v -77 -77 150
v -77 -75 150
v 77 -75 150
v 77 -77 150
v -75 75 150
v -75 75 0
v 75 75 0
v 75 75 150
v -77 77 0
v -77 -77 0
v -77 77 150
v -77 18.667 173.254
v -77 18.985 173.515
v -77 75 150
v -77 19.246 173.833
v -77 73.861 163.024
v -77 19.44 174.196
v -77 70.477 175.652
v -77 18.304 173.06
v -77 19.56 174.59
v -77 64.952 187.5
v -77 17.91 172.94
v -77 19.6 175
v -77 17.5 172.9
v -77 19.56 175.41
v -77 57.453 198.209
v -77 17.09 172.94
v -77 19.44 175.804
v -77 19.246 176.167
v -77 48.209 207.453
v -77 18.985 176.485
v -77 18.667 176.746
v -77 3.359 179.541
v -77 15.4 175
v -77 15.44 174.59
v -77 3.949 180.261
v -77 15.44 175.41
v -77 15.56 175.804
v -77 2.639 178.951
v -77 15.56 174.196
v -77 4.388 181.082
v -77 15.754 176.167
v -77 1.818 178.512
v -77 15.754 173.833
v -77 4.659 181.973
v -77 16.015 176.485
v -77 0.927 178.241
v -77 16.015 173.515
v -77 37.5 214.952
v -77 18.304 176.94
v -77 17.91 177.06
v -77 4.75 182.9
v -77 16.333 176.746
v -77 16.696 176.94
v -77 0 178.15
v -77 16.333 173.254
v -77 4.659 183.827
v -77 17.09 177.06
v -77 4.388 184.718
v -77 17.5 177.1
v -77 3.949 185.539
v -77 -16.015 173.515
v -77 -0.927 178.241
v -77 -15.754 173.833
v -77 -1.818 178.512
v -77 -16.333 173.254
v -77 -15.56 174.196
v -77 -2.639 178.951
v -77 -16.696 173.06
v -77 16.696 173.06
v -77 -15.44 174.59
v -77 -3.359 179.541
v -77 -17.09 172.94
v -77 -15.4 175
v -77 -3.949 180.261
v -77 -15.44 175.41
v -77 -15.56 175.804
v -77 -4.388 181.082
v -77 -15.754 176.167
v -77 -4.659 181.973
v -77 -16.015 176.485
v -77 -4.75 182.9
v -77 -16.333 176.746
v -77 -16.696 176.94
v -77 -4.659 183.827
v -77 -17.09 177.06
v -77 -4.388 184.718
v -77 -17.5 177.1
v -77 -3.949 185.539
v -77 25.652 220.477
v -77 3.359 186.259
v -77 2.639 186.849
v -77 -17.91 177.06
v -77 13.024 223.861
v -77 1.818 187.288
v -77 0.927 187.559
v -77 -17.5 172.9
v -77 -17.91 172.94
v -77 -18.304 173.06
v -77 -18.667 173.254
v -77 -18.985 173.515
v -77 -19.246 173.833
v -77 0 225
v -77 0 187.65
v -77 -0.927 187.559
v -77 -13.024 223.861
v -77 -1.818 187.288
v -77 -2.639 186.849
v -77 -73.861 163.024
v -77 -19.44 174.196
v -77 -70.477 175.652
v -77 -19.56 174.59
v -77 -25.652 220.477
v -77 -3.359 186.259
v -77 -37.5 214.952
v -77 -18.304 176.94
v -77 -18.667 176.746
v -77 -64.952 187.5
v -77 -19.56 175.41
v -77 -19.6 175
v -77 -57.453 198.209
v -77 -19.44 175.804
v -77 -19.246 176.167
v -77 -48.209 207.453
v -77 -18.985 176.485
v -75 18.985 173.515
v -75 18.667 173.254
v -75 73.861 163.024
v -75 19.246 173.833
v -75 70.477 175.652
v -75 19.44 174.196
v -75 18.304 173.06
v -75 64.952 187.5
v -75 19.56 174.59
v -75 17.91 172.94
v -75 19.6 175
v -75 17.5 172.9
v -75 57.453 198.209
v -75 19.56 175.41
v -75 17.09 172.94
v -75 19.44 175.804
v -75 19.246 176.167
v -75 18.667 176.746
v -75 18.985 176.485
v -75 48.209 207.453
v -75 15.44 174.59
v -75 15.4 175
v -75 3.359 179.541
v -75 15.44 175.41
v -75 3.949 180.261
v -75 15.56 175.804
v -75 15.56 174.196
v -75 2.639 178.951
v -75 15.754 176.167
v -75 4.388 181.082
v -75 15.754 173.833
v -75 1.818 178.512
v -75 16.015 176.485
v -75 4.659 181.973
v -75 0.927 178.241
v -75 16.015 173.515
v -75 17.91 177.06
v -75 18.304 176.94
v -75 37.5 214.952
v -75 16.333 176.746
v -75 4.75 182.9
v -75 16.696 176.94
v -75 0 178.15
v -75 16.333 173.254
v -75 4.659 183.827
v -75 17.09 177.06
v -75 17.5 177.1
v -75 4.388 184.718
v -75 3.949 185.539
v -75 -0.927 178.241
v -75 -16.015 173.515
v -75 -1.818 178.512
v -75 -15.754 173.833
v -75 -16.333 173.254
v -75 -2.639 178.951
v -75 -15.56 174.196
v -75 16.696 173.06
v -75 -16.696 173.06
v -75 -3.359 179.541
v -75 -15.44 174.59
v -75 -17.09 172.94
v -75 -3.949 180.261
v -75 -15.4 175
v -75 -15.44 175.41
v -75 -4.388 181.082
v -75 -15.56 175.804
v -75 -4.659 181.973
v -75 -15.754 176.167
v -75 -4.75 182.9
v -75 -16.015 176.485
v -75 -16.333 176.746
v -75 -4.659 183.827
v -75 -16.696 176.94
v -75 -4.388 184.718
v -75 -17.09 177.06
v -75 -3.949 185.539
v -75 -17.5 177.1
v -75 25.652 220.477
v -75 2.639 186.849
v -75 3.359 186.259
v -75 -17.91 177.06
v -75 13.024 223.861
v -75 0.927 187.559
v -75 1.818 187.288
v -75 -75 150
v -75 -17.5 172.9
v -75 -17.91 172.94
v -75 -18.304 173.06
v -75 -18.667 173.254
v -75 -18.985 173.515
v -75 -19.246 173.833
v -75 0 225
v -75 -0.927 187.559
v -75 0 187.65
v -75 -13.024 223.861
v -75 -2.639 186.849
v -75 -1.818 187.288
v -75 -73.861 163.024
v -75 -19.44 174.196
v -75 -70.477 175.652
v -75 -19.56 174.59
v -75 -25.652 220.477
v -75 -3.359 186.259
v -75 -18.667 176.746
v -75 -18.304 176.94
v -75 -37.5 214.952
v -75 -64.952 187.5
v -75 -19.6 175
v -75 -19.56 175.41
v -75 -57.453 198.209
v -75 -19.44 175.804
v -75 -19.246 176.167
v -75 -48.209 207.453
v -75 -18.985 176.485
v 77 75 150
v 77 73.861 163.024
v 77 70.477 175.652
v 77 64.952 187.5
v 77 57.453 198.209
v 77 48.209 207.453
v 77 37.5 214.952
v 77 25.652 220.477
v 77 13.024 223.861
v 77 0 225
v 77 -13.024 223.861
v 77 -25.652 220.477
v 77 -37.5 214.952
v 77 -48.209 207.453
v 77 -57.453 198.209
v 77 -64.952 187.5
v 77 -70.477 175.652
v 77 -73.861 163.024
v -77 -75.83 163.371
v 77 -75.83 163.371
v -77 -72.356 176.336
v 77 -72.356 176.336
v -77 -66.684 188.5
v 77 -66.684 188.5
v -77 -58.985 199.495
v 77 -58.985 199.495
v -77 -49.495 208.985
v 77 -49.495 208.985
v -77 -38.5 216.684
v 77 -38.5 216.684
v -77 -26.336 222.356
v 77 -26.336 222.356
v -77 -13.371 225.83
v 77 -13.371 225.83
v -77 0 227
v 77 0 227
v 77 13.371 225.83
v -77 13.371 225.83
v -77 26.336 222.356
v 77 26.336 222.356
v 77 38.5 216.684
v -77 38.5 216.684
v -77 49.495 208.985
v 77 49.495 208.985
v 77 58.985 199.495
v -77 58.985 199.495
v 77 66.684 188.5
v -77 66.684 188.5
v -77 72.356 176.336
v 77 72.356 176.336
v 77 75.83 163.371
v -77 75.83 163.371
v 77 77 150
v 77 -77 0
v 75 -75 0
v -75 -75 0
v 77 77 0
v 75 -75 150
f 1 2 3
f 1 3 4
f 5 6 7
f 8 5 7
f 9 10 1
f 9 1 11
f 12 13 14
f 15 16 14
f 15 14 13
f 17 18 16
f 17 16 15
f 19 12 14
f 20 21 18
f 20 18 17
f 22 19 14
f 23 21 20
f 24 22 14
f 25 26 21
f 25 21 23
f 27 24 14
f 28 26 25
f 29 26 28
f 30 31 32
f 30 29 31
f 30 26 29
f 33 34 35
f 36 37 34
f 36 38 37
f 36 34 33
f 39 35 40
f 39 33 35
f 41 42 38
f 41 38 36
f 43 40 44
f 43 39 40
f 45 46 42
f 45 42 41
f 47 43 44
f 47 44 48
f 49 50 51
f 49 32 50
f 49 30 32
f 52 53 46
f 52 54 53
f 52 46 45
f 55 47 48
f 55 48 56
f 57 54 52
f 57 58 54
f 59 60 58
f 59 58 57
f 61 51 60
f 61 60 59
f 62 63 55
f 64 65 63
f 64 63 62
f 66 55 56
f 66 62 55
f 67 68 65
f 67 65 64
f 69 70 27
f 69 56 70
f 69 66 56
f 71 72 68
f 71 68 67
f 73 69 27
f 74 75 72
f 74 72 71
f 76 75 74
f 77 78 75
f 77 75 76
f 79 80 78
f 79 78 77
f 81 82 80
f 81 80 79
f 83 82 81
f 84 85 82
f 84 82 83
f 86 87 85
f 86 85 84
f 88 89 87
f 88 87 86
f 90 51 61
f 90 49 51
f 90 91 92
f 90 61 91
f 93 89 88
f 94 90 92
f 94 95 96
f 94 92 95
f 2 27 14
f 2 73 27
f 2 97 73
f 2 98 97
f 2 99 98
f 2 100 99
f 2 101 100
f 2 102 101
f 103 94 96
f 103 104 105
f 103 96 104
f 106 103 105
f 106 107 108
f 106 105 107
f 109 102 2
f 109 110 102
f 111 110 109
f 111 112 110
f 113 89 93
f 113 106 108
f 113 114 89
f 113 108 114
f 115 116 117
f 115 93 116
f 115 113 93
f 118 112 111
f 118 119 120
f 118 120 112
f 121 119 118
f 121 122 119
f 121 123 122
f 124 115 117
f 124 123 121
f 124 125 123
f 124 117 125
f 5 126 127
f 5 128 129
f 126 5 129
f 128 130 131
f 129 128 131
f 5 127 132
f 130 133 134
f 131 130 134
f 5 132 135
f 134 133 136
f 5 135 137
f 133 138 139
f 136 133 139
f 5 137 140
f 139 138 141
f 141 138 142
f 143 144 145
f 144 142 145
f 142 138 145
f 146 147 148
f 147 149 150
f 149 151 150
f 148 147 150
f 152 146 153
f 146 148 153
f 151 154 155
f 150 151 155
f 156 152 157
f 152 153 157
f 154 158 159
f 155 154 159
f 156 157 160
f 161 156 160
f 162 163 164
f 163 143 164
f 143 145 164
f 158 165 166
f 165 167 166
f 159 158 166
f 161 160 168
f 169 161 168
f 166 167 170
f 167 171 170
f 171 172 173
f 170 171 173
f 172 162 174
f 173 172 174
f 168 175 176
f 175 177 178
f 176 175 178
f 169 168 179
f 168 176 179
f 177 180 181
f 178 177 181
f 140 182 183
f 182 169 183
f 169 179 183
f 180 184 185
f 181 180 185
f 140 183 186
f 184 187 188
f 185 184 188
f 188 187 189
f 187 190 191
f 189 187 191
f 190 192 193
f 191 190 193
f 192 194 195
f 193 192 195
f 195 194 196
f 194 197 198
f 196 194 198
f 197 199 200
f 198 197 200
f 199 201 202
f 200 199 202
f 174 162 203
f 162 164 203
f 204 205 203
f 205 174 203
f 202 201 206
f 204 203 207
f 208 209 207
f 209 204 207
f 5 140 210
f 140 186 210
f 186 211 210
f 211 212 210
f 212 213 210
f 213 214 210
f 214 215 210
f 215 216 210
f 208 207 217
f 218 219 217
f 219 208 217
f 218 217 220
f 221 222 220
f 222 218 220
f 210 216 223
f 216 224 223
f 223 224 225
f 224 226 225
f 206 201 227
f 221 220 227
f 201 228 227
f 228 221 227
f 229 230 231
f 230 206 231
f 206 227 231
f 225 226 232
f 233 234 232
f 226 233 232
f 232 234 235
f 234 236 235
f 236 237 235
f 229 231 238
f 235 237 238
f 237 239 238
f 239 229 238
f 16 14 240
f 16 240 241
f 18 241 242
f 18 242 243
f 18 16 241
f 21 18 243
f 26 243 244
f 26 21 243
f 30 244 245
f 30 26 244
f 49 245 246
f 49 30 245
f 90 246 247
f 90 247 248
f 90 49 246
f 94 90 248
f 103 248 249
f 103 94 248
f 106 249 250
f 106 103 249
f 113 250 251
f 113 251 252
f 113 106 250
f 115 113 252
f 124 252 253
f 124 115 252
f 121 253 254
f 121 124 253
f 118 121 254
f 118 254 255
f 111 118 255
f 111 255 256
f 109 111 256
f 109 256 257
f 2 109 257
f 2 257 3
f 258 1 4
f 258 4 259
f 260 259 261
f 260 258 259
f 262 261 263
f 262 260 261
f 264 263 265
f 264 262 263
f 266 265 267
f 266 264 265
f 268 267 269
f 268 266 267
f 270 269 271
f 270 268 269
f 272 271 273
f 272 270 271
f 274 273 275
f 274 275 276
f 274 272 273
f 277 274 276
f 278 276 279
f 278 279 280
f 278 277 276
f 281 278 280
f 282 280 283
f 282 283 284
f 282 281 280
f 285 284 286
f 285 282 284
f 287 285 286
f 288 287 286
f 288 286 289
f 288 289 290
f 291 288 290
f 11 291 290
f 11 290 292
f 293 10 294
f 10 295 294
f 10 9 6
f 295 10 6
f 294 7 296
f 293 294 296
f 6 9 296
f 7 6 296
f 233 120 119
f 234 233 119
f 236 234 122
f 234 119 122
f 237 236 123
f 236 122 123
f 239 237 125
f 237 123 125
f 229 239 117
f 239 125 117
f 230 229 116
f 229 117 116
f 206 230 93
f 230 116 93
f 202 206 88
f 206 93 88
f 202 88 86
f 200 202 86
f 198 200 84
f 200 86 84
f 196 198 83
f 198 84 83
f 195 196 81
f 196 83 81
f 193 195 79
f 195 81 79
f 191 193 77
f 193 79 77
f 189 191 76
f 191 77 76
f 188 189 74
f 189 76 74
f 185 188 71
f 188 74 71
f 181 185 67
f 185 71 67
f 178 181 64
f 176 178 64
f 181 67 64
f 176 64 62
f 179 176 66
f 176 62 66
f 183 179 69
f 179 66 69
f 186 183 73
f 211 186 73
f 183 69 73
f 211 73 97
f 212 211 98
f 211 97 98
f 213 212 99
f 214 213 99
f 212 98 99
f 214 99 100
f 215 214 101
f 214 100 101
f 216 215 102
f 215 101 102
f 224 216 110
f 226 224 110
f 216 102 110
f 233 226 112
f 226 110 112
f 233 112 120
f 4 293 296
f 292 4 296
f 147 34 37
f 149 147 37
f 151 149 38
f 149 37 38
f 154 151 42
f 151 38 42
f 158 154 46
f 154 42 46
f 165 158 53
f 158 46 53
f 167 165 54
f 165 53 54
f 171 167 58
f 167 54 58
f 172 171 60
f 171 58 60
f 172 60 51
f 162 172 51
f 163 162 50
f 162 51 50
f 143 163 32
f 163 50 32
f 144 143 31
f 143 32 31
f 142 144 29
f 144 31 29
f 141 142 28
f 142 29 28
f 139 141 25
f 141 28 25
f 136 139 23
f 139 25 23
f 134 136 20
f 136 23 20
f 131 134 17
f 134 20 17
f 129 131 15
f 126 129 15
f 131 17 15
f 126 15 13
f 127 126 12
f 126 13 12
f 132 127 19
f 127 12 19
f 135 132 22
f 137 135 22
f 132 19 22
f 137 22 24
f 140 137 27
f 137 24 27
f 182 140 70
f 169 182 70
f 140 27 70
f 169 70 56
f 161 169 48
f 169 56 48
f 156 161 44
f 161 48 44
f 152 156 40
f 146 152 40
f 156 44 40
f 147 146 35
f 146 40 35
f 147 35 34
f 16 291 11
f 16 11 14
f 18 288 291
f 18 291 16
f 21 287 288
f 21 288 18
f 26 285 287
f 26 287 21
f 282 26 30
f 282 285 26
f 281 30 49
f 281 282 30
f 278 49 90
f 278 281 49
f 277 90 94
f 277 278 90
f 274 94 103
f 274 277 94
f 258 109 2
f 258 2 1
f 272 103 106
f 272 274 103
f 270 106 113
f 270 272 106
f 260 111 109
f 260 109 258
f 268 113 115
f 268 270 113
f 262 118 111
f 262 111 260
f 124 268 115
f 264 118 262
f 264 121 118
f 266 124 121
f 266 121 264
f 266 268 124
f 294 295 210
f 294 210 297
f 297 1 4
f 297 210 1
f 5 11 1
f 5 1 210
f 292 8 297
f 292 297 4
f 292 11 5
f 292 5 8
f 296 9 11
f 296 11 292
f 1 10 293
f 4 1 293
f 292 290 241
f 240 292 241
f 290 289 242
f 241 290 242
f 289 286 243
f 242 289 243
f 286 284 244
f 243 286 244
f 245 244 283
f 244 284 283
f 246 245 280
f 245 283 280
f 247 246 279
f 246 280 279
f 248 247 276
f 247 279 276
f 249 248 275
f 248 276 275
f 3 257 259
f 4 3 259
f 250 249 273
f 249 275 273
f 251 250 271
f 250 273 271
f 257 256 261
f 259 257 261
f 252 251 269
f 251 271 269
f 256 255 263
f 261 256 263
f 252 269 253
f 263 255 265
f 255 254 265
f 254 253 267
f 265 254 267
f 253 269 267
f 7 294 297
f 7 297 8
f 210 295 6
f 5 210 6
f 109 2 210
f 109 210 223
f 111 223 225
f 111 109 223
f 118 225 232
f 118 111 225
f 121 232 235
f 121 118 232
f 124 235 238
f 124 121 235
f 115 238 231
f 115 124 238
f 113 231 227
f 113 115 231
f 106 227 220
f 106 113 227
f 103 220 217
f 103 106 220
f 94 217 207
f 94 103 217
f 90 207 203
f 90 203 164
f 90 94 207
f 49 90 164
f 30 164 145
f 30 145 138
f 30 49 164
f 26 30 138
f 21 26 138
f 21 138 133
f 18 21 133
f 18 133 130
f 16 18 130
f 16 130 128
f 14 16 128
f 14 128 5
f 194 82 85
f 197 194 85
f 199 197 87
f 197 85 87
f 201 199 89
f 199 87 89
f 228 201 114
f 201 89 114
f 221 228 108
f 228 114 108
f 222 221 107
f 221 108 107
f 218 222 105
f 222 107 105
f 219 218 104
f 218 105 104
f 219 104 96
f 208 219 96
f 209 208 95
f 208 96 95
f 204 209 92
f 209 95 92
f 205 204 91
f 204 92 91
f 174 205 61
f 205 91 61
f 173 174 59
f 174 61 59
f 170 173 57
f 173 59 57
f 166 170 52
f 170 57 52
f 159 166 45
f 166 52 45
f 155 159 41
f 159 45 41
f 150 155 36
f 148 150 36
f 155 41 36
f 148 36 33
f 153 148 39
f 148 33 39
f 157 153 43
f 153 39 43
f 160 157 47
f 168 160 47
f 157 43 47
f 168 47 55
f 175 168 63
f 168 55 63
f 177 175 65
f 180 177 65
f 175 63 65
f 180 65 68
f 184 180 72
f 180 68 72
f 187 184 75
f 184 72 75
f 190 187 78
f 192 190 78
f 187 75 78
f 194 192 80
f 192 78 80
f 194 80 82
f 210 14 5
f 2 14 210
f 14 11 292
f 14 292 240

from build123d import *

# Parameters (mm, degrees)
F2_W     = 154
F2_H     = 154
F2_W_2   = 150
F2_H_2   = 150
F3_DEPTH = 150
F5_DEPTH = 154
F4_R     = 2.1
F4_R_2   = 4.75
F6_DEPTH = 2


with BuildPart() as f3:
    # F2 (on Top) → F3 (new body)
    with BuildSketch(Plane.XY):
        Rectangle(F2_W, F2_H)
        Rectangle(F2_W_2, F2_H_2, mode=Mode.SUBTRACT)
    extrude(amount=F3_DEPTH)


with BuildPart() as f5:
    # F4 (on face) → F5 (new body)
    with BuildSketch(Plane(origin=(-77, 0, 0), x_dir=(0, -1, 0), z_dir=(-1, 0, 0))):
        with BuildLine():
            ThreePointArc((-75, 150), (0, 225), (75, 150))
            Line((75, 150), (77, 150))
            ThreePointArc((77, 150), (0, 227), (-77, 150))
            Line((-77, 150), (-75, 150))
        make_face()
    extrude(amount=-F5_DEPTH)


with BuildPart() as f6:
    # F4 (on face) → F6 (new body)
    with BuildSketch(Plane(origin=(-77, 0, 0), x_dir=(0, -1, 0), z_dir=(-1, 0, 0))):
        with BuildLine():
            Line((-75, 150), (75, 150))
            ThreePointArc((75, 150), (0, 225), (-75, 150))
        make_face()
        with Locations((-17.5, 175)):
            Circle(F4_R, mode=Mode.SUBTRACT)
        with Locations((0, 182.9)):
            Circle(F4_R_2, mode=Mode.SUBTRACT)
        with Locations((17.5, 175)):
            Circle(F4_R, mode=Mode.SUBTRACT)
    extrude(amount=-F6_DEPTH)


solid = Compound([f3.part, f5.part, f6.part])
